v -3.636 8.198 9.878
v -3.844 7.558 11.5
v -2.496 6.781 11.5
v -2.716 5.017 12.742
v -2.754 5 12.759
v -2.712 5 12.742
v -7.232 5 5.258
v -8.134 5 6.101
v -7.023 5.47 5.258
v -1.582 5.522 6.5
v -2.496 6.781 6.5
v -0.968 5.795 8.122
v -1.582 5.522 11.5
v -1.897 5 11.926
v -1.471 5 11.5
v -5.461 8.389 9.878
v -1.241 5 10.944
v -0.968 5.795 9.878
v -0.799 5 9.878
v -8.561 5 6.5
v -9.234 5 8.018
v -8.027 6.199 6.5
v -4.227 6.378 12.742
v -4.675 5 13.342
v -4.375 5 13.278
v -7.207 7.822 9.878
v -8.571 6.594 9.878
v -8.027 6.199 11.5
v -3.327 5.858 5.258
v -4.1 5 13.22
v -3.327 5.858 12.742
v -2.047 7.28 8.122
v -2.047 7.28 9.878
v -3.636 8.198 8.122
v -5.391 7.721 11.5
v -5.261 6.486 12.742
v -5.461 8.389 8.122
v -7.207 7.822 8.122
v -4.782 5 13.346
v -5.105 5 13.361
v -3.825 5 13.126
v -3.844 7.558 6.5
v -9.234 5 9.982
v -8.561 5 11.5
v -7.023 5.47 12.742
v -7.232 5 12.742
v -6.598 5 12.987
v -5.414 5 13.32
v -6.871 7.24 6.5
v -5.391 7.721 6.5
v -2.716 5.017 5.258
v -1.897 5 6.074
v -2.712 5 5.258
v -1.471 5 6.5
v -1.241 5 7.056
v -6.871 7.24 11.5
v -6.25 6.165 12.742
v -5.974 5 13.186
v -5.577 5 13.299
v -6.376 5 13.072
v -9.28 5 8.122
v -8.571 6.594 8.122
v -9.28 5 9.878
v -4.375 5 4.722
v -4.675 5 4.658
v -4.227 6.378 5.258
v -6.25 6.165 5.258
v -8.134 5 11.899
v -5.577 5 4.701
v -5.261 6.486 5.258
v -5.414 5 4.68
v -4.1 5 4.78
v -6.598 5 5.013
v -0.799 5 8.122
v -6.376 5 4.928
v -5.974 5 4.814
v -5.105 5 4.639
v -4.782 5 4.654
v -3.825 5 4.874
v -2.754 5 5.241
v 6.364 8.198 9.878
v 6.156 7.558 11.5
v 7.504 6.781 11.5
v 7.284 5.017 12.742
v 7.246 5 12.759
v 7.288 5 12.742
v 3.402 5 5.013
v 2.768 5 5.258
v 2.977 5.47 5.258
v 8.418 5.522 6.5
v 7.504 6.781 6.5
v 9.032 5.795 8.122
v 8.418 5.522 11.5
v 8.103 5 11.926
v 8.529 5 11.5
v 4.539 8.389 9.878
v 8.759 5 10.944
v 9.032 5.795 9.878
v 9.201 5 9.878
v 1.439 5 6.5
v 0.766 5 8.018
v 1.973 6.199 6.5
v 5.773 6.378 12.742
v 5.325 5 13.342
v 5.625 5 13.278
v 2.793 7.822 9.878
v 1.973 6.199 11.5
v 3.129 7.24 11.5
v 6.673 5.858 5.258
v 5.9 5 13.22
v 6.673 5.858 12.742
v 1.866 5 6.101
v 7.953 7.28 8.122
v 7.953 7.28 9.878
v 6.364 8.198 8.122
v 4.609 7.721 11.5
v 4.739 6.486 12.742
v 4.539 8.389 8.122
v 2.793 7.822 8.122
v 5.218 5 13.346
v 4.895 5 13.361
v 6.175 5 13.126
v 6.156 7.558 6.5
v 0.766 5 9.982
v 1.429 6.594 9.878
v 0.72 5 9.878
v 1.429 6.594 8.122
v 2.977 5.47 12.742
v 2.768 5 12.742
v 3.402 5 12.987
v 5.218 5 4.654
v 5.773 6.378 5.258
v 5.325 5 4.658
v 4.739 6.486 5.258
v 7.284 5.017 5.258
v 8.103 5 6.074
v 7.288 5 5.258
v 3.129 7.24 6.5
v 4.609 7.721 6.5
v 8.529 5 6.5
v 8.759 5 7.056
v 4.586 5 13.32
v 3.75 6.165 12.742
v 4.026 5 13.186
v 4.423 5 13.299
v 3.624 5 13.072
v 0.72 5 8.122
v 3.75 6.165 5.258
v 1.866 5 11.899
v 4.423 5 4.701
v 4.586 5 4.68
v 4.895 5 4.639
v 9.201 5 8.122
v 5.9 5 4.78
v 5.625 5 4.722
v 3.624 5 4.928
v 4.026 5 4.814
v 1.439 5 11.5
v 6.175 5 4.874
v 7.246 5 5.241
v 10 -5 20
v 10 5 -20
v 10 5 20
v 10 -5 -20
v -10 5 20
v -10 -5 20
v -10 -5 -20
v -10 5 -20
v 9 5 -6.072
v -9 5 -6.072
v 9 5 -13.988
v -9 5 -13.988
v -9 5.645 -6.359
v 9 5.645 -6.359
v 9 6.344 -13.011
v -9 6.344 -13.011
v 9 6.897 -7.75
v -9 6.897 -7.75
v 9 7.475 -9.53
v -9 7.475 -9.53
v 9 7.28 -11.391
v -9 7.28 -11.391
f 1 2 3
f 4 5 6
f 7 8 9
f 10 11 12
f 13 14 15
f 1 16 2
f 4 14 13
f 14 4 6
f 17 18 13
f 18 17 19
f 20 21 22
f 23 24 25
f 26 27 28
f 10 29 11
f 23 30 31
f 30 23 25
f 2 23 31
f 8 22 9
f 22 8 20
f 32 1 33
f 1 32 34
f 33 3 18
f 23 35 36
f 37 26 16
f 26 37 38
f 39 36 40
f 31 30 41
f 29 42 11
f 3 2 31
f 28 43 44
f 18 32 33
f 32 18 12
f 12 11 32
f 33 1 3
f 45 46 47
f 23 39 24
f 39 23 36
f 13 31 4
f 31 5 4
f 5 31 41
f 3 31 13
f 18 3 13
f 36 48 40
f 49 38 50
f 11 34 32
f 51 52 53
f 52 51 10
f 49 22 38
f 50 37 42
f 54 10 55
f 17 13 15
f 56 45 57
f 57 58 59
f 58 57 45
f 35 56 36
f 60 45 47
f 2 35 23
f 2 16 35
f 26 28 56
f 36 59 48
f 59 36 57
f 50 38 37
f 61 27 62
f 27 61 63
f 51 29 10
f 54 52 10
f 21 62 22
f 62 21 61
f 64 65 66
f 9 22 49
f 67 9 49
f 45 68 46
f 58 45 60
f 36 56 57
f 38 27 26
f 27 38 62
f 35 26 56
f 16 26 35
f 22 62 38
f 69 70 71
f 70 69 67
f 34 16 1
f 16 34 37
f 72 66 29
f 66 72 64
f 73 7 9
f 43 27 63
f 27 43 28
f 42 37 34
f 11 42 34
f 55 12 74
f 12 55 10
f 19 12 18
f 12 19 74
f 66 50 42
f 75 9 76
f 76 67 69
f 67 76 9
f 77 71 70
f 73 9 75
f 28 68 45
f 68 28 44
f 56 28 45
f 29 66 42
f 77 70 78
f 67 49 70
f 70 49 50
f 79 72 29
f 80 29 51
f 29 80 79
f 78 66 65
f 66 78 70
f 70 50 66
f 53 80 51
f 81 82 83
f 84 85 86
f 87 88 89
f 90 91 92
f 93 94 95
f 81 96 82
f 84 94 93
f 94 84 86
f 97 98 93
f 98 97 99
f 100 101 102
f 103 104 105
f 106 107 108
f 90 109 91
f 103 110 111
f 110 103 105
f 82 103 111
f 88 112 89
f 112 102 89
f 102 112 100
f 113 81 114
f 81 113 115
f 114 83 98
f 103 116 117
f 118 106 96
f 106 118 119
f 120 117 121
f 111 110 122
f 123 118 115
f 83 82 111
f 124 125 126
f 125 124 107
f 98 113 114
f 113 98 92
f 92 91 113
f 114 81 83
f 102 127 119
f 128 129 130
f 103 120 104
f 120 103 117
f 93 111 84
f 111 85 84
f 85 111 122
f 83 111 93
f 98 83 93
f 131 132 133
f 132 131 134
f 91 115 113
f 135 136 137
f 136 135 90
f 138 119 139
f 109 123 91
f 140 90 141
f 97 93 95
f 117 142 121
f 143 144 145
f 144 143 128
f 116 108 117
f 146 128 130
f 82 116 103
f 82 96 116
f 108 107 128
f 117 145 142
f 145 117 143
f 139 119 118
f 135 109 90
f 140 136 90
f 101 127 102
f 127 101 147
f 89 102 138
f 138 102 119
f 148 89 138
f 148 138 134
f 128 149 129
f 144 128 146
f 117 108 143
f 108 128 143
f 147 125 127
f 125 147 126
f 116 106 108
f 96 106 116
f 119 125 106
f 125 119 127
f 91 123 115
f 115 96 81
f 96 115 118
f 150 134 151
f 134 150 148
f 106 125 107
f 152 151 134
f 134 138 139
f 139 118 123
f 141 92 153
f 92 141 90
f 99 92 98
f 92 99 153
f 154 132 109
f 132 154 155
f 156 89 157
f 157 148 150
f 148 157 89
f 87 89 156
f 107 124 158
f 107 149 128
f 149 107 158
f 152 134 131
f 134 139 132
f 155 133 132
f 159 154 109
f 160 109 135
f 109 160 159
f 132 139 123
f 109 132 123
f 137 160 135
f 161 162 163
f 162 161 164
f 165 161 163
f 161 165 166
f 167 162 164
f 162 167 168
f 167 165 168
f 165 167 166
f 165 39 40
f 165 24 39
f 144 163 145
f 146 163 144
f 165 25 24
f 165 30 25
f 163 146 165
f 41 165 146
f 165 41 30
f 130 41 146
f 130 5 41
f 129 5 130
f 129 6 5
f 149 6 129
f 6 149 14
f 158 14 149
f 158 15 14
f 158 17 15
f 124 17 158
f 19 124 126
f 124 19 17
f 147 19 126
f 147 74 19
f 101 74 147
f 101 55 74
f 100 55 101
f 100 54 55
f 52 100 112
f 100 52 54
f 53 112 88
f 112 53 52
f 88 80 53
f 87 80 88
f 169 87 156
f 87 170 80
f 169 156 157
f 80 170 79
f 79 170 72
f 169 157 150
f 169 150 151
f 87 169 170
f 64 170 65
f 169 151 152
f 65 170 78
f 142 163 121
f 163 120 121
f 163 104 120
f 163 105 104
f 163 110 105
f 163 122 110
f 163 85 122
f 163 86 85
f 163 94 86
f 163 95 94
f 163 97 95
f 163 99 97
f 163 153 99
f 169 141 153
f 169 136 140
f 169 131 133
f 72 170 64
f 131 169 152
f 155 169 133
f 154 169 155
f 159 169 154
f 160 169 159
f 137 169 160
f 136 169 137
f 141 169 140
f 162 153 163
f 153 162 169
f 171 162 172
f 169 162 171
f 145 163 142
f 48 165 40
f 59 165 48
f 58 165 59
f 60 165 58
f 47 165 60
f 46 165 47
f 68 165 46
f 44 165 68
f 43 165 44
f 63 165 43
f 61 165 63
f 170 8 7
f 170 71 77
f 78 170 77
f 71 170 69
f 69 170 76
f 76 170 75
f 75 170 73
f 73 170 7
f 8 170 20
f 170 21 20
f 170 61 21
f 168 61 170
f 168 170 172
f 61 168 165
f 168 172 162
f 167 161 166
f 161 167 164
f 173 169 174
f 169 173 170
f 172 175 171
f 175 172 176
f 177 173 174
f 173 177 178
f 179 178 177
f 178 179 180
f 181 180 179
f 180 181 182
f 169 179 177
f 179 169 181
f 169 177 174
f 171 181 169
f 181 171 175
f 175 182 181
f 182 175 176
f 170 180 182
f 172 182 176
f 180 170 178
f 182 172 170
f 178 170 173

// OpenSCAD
cube([20,10,40], center=true);

translate([0,4,9]){
    translate([-5,0,0]){
        sphere(r=4.5);
    }
    translate([5,0,0]){
        sphere(r=4.5);
    }
}

translate([0,3,-10]){
    rotate([0,90,0]){
        cylinder(h=18, r=4.5, center=true);
    }
}
